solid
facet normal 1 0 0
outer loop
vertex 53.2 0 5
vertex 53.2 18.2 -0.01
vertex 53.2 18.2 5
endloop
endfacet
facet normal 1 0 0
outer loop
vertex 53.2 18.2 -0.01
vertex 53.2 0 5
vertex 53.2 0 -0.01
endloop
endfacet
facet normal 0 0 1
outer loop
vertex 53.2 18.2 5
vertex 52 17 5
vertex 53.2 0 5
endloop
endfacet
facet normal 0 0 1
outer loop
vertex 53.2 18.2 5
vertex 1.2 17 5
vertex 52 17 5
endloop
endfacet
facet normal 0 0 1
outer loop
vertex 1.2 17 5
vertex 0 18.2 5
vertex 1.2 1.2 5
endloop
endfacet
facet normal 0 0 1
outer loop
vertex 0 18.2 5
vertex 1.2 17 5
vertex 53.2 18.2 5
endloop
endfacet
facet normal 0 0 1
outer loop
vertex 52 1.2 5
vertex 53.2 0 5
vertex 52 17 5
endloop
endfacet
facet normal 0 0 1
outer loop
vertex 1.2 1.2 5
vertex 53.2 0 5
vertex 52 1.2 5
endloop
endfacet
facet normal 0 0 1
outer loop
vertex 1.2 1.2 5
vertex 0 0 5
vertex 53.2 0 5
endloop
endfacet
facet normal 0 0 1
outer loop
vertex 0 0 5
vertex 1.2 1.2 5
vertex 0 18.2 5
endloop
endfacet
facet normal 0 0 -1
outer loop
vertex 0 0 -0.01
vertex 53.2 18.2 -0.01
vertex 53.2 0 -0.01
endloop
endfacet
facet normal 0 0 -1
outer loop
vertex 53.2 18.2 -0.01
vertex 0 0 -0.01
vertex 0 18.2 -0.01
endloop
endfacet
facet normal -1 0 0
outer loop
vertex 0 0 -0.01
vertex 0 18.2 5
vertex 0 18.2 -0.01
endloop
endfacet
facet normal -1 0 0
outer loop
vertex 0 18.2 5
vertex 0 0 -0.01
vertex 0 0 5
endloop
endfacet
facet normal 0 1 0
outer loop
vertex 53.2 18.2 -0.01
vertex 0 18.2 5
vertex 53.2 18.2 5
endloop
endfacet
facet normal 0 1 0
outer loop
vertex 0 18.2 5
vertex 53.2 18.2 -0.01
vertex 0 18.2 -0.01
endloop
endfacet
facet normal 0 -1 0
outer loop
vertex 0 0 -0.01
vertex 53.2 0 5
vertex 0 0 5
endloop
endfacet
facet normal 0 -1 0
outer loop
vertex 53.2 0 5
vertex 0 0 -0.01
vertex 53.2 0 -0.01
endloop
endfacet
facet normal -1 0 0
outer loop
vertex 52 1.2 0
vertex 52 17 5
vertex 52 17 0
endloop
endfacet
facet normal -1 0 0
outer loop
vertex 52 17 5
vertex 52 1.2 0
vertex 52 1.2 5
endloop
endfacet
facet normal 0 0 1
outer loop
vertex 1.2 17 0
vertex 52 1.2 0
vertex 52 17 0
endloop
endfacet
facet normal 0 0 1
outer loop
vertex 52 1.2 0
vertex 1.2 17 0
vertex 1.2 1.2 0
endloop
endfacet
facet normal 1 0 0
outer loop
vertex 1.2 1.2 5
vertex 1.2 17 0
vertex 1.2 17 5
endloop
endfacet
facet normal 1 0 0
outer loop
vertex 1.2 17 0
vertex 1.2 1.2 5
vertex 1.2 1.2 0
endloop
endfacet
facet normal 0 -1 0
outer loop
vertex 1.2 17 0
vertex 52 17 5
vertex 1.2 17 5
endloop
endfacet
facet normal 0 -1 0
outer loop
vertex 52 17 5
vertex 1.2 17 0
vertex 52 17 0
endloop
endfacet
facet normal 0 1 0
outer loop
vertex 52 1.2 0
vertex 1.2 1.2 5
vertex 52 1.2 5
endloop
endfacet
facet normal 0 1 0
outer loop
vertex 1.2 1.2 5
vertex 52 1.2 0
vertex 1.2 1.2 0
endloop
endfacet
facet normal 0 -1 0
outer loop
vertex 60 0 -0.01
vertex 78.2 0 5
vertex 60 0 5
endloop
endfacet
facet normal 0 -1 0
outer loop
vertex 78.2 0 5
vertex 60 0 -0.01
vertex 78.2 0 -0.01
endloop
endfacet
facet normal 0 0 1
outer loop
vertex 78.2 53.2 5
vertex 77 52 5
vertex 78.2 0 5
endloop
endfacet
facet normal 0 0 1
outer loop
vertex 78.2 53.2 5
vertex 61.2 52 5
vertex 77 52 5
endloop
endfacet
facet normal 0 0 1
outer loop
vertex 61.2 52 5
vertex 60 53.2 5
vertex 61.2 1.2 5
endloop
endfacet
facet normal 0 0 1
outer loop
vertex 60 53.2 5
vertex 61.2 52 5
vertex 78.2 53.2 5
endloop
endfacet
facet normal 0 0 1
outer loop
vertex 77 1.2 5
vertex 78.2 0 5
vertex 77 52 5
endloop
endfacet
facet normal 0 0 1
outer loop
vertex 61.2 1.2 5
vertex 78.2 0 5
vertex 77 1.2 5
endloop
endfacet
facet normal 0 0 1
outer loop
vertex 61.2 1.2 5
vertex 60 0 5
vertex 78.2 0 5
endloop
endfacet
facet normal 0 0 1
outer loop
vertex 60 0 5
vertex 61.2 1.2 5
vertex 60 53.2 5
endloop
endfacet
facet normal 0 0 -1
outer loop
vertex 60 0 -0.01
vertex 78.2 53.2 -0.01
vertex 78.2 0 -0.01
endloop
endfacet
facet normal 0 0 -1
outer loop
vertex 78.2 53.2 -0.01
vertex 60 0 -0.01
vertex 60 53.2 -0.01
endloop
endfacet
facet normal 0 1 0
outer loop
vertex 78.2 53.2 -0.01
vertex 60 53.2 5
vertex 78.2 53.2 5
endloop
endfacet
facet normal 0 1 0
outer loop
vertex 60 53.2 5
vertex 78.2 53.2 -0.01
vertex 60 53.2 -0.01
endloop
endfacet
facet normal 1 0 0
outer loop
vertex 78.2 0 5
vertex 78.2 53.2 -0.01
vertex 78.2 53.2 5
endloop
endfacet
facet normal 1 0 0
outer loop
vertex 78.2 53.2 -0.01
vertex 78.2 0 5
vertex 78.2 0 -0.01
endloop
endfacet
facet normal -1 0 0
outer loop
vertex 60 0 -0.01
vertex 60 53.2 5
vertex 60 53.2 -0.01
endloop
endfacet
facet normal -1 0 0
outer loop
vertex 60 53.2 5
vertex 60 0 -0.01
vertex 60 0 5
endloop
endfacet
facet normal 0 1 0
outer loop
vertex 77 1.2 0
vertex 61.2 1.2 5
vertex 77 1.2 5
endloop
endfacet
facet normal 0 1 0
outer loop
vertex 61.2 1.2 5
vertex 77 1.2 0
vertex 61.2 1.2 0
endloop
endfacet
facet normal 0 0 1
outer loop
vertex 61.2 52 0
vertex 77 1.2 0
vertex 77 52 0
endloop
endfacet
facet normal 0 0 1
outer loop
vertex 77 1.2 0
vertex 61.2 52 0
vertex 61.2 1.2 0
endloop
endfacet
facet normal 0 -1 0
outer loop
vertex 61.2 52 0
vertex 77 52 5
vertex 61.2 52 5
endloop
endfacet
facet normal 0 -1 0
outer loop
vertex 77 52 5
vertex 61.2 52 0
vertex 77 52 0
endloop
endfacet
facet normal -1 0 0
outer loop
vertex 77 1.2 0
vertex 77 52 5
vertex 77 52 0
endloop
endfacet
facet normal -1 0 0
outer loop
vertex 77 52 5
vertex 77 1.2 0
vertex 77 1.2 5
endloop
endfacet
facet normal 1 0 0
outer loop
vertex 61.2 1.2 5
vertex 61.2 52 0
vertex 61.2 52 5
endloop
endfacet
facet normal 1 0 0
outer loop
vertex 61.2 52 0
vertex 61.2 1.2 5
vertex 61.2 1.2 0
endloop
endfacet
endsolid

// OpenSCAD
// file: ../../Base/Boxes.scad
// Fischertechnik Box Foundation
// Pre-designed Boxes

use <Constants.scad>

include <PlacementOptions.scad>

box190Width = 190;
box190Depth = 130;
box130Width = 130;
box130Depth = 95;
boxUsageHeight = 33.9;
boxWallThickness = 2.4;
boxBaseThickness = 1.0;

// getBoxWallThickness()
// Gets the wall thickness of a Fischertechnik Box

function getBoxWallThickness() = boxWallThickness;

// Gets the usable height of a fischertechnik box
function getBoxUsageHeight() = boxUsageHeight;

// Gets the thickness of the Fischertechnik box base.
function getBoxBaseThickness() = boxBaseThickness;

// Gets the usable inner space of a Box 190 as an x/y-list
function getBox190Space() = [
    box190Width - 2*getBoxWallThickness(), 
    box190Depth - 2*getBoxWallThickness() ];

// Imports the Fischertechnik empty box 130x190 mm and places it at position 0,0
// 190x130 are the outer sizes, the inner space is slightly smaller. Use getBox190Space() to get the inner sizes.
// This module needs the STL file "Fischertechnik Box 130x190.stl" in the library path.
// The box is positioned that the usable inner space is at the 0,0,0 position. The

module Box190() {
    translate([-getBoxWallThickness(),-getBoxWallThickness(),-getBoxBaseThickness()])
        import("Fischertechnik Box 130x190.stl", convexity=3);
}

// Gets the usable inner space of a Box 130 as an x/y-list
function getBox130Space() = [
    box130Width - 2*getBoxWallThickness(), 
    box130Depth - 2*getBoxWallThickness() ];

// Imports the Fischertechnik empty box 95x130 mm and places it at position 0,0
// 190x130 are the outer sizes, the inner space is slightly smaller. Use getBox190Space() to get the inner sizes.
// This module needs the STL file "Fischertechnik Box 95x130.stl" in the library path.
// The box is positioned that the usable inner space is at the 0,0,0 position. The

module Box130() {
    translate([-getBoxWallThickness(),-getBoxWallThickness(),-getBoxBaseThickness()])
        import("Fischertechnik Box 95x130.stl", convexity=3);
}

// Creates a web at the specified box walls
// corner 0 = LowerLeft, 1 = UpperLeft, 2 = UpperRight, 3 = LowerRight
// side 0 = LeftOfCorner, 1 = RightOfCorner
// distance = Distance in mm from the corner
// box = inner width and depth of the box (default: Box 190)
// webWidth = length of the web (default is 3 mms)
// webThickness = thickness of the web (default is 1 mm)

module BoxWeb(corner, side, distance, box=getBox190Space(), webWidth=3, webThickness=1.0) {
    sink = getBoxWallThickness()/2;

    width = (corner % 2 == 0) ? 
            (side == LeftOfCorner ? webWidth : webThickness) :
            (side == LeftOfCorner ? webThickness : webWidth);

    depth = (corner % 2 == 0) ? 
            (side == RightOfCorner ? webWidth : webThickness) :
            (side == RightOfCorner ? webThickness : webWidth);
    
    xDiff = corner == LowerLeft ? 
                (side == LeftOfCorner ? -sink : distance) :
            (corner == UpperLeft ?                
                (side == LeftOfCorner ? distance : -sink) :
            (corner == UpperRight ?
                (side == LeftOfCorner ? box.x-webWidth+sink : box.x-distance-webThickness) :
                (side == LeftOfCorner ? box.x-distance-webThickness: box.x-webWidth+sink)));

    yDiff = corner == LowerLeft ? 
                (side == RightOfCorner ? -sink : distance) :
            (corner == UpperLeft ?
                (side == RightOfCorner ? box.y-distance : box.y-webWidth+sink) :
            (corner == UpperRight ?
                (side == RightOfCorner ? box.y-webWidth+sink : box.y-distance) :
                (side == RightOfCorner ? distance : -sink)));
    
    translate([xDiff, yDiff, -getExcess()])
        cube([width, depth, boxUsageHeight + 2*getExcess()]);
}
// file: ../../Base/Rotation.scad
// Fischertechnik Box Foundation
// Geometry Helpers Rotation

include <PlacementOptions.scad>

// getRotatedSpace(space, rotation=NoRotation)
// Rotates the space dependent on the specified rotation

function getRotatedSpace(space, rotation=NoRotation) = [
    (rotation == Rotate90 || rotation == Rotate270) ? space.y : space.x,
    (rotation == Rotate90 || rotation == Rotate270) ? space.x : space.y
];

// Rotates the given space around the fixed left lower corner
// space = the space the children needs as width/depth list [width,depth]
// rotation = 0 Rotate0 degrees, 1 Rotate90 degrees, 2 Rotate180 degrees, 3 Rotate270 degrees (equivalent to -90)

module RotateFix(space, rotation=Rotate0) {
    dy = (rotation == Rotate0 || rotation == Rotate270) ? 0 :
        (rotation == Rotate90) ? space.x :
        space.y;
    dx = (rotation < Rotate180) ? 0 :
        (rotation == Rotate180) ? space.x :
        space.y;
    
    translate([dx, dy, 0])
        rotate([0, 0, rotations[rotation]])
            children();
}
// file: ../../Base/Alignment.scad
// Fischertechnik Box Foundation
// Geometry Helpers Alignment

include <PlacementOptions.scad>

// getAlignedX(elementWidth, spaceWidth, align=AlignRight, offset=0)
// Gets the aligned X offset of an element with the given
// width in the given space.
// elementWidth = The width of the element to positon
// spaceWidth = The space where the element should be aligned
// align = 0 AlignLeft, 1 AlignCenter, 2 AlignRight
// offset = an optional offset from the aligned position. When
// aligned left or centered, then positive values are in X direction.
// When aligned right then positive values are in negative X direction.

function getAlignedX(elementWidth, spaceWidth, align=AlignRight, offset=0) =
    (align == AlignLeft) ?
        offset :
        ((align == AlignCenter) ?
        (spaceWidth - elementWidth)/2 + offset :
        spaceWidth - offset - elementWidth);

// getAlignedY(elementDepth, spaceDepth, align=AlignTop, offset=0)
// Gets the aligned Y offset of an element with the given
// depth in the given space.
// elementDepth = The depth of the element to positon
// spaceDepth = The space where the element should be aligned
// align = 0 AlignBottom, 1 AlignCenter, 2 AlignTop
// offset = an optional offset from the aligned position. When
// aligned bottom or centered, then positive values are in Y direction.
// When aligned top then positive values are in negative Y direction.

function getAlignedY(elementDepth, spaceDepth, align=AlignTop, offset=0) =
    (align == AlignBottom) ?
        offset :
        ((align == AlignCenter) ?
        (spaceDepth - elementDepth)/2 + offset :
        spaceDepth - offset - elementDepth);
// file: ../../Base/Constants.scad
// Fischertechnik Box Foundation
// Constants

// Constant values necessary for multiple elements

// Base constants
dividerThickness = 1.2;
excess = 0.01;
fragments = 90;
tolerance = 0.8;

// Gets the thickness of a divider 
function getDividerThickness() = dividerThickness;

// Gets the excess that is used to merge walls into each other
function getExcess() = excess;

// Gets amount of fragments of a cylinder
function getFragments() = fragments;

// Gets the inner tolerance of a frame to each side
function getTolerance() = tolerance;


// Fischertechnik specific constants
axisDiameter = 4;
axisBottomDiameter = axisDiameter + 1;
standardEdgeDistance = 2.5;
standardWebDistance = 11.5;
standardCornerLength = 15;
tubeWallFactor = 1.6;

// Gets axis diameter
function getAxisDiameter() = axisDiameter;

// Gets axis bottom diameter for thicker part at the bottom
function getAxisBottomDiameter() = axisBottomDiameter;

// gets the standard distance to the wall of the box for dockable frames with webs
function getStandardEdgeDistance() = standardEdgeDistance;

// gets the standard distance of each web to the corner of the dockable frame
function getStandardWebDistance() = standardWebDistance;

// gets the standard length of the corner walls of a dockable frame
function getStandardCornerLength() = standardCornerLength;

// gets the wall thickness of a tube.
function getTubeWallThickness() = tubeWallFactor * getDividerThickness();
// file: ../../Base/PlacementOptions.scad
// Fischertechnik Box Foundation
// Placement Options

// Alignment
NoAlign = 0;
AlignLeft = 1;
AlignBottom = 2;
AlignCenter = 3;
AlignRight = 4;
AlignTop = 5;

// Element rotation degree steps
rotations = [0, -90, -180, -270];

// Rotation
NoRotation = 0;
Rotate0 = 0;
Rotate90 = 1;
Rotate180 = 2;
Rotate270 = 3;

// Docking (seen from above)
NoDock = -1;
DockLeft = 0;
DockTop = 1;
DockRight = 2;
DockCorner = 2;
DockBottom = 3;

// Web corners
LowerLeft = 0;
UpperLeft = 1;
UpperRight = 2;
LowerRight = 3;

// Web position relative to corner
LeftOfCorner = 0;
RightOfCorner = 1;
// file: ../../Elements/FrameHingedBlock.scad
// Fischertechnik Box Library
// Frame for Hinged Block
// 31008

use <../Base/Constants.scad>
use <../ModelBase/Simple.scad>

width = 50;
depth = 15;
height = 5;

// getFrameHingedBlockSpace()
// Gets the space for the hinged block frame.

function getFrameHingedBlockSpace() = getFrameOuterVolume([width, depth, height]);

// FrameHingedBlock()
// Frame for hinged block
// 31008

module FrameHingedBlock() {
    Frame([width, depth, height]);
}

// Test
color("lightgray")
FrameHingedBlock();
// file: ../../Base/Placement.scad
// Fischertechnik Box Foundation
// Geometry Helpers Placement

use <Constants.scad>
use <Alignment.scad>
use <Rotation.scad>
use <Boxes.scad>

include <PlacementOptions.scad>

// Place(x=0, y=0, elementSpace=[0,0], alignX=AlignLeft, alignY=AlignBottom, rotation=Rotate0, boxSpace=getBox190Space())
// Places the child at the specified position
// y = Y-Position. This is a relative position when an X aligment is specified.
// x = X-Position. This is a relative position when an Y aligment is specified.
// elementSpace = space of the element to be placed [x,y]
// alignX = -1=NoAlign, 0 AlignLeft, 1 AlignCenter, 3 AlignRight (elementSpace and boxSpace required!)
// alignY = -1=NoAlign, 2 AlignBottom, 1 AlignCenter, 4 AlignTop (elementSpace and boxSpace required!)
// rotation = 0 Rotate0 0 degrees, 1 Rotate90 90 degrees, 
// 2 Rotate180 180 degrees, 3 Rotate270 270 degrees (equivalent to -90)
// boxSpace = Inner space of the box where the placement occurs [x,y] - default is Box 190x130 inner space

module Place(x=0, y=0, elementSpace=[0,0], 
  alignX=AlignLeft, alignY=AlignBottom, 
  rotation=NoRotation, boxSpace=getBox190Space()) {

    module Position(x, y, space, rotation=Rotate0) {
        translate([x, y, 0])
            RotateFix(space, rotation)
                children(0);
    }

    space = getRotatedSpace(elementSpace, rotation);
    alignedX = getAlignedX(space.x, boxSpace.x, alignX, x);
    alignedY = getAlignedY(space.y, boxSpace.y, alignY, y);
    Position(alignedX, alignedY, elementSpace, rotation)
        children(0);
}

// Center(space=getBox130Space(), elementSpace=[0,0])
// space = Space where the children is centered. For cylinder use centered=true and no elementSpace.
// elementSpace = space of the element to be centered [x,y]

module Center(space=getBox190Space(), elementSpace=[0,0]) {
    translate([(space.x - elementSpace.x) / 2, (space.y - elementSpace.y) / 2])
        children(0);
}

// CenterHorizontal(width=0, y=0, offset=0, space=getBox130Space())
// space = Space where the children is centered. For cylinder use centered=true and no elementSpace.
// elementSpace = space of the element to be centered [x,y]

module CenterHorizontal(width=0, y=0, offset=0, space=getBox190Space()) {
    translate([(space.x - width) / 2 + offset, y])
        children(0);
}

// CenterVertical(depth=0, x=0, offset=0, space=getBox130Space())
// space = Space where the children is centered. For cylinder use centered=true and no elementSpace.
// elementSpace = space of the element to be centered [x,y]

module CenterVerticalal(depth=0, x=0, offset=0, space=getBox190Space()) {
    translate([x, (space.y - depth) / 2 + offset])
        children(0);
}
// main file
// Fischertechnik Box Foundation
// Elements
// Test FrameHingedBlock

use <../../Base/Placement.scad>
use <../../Elements/FrameHingedBlock.scad>

include <../../Base/PlacementOptions.scad>

FrameHingedBlock();

Place(60, 0, getFrameHingedBlockSpace(), rotation=Rotate90)
    FrameHingedBlock();
